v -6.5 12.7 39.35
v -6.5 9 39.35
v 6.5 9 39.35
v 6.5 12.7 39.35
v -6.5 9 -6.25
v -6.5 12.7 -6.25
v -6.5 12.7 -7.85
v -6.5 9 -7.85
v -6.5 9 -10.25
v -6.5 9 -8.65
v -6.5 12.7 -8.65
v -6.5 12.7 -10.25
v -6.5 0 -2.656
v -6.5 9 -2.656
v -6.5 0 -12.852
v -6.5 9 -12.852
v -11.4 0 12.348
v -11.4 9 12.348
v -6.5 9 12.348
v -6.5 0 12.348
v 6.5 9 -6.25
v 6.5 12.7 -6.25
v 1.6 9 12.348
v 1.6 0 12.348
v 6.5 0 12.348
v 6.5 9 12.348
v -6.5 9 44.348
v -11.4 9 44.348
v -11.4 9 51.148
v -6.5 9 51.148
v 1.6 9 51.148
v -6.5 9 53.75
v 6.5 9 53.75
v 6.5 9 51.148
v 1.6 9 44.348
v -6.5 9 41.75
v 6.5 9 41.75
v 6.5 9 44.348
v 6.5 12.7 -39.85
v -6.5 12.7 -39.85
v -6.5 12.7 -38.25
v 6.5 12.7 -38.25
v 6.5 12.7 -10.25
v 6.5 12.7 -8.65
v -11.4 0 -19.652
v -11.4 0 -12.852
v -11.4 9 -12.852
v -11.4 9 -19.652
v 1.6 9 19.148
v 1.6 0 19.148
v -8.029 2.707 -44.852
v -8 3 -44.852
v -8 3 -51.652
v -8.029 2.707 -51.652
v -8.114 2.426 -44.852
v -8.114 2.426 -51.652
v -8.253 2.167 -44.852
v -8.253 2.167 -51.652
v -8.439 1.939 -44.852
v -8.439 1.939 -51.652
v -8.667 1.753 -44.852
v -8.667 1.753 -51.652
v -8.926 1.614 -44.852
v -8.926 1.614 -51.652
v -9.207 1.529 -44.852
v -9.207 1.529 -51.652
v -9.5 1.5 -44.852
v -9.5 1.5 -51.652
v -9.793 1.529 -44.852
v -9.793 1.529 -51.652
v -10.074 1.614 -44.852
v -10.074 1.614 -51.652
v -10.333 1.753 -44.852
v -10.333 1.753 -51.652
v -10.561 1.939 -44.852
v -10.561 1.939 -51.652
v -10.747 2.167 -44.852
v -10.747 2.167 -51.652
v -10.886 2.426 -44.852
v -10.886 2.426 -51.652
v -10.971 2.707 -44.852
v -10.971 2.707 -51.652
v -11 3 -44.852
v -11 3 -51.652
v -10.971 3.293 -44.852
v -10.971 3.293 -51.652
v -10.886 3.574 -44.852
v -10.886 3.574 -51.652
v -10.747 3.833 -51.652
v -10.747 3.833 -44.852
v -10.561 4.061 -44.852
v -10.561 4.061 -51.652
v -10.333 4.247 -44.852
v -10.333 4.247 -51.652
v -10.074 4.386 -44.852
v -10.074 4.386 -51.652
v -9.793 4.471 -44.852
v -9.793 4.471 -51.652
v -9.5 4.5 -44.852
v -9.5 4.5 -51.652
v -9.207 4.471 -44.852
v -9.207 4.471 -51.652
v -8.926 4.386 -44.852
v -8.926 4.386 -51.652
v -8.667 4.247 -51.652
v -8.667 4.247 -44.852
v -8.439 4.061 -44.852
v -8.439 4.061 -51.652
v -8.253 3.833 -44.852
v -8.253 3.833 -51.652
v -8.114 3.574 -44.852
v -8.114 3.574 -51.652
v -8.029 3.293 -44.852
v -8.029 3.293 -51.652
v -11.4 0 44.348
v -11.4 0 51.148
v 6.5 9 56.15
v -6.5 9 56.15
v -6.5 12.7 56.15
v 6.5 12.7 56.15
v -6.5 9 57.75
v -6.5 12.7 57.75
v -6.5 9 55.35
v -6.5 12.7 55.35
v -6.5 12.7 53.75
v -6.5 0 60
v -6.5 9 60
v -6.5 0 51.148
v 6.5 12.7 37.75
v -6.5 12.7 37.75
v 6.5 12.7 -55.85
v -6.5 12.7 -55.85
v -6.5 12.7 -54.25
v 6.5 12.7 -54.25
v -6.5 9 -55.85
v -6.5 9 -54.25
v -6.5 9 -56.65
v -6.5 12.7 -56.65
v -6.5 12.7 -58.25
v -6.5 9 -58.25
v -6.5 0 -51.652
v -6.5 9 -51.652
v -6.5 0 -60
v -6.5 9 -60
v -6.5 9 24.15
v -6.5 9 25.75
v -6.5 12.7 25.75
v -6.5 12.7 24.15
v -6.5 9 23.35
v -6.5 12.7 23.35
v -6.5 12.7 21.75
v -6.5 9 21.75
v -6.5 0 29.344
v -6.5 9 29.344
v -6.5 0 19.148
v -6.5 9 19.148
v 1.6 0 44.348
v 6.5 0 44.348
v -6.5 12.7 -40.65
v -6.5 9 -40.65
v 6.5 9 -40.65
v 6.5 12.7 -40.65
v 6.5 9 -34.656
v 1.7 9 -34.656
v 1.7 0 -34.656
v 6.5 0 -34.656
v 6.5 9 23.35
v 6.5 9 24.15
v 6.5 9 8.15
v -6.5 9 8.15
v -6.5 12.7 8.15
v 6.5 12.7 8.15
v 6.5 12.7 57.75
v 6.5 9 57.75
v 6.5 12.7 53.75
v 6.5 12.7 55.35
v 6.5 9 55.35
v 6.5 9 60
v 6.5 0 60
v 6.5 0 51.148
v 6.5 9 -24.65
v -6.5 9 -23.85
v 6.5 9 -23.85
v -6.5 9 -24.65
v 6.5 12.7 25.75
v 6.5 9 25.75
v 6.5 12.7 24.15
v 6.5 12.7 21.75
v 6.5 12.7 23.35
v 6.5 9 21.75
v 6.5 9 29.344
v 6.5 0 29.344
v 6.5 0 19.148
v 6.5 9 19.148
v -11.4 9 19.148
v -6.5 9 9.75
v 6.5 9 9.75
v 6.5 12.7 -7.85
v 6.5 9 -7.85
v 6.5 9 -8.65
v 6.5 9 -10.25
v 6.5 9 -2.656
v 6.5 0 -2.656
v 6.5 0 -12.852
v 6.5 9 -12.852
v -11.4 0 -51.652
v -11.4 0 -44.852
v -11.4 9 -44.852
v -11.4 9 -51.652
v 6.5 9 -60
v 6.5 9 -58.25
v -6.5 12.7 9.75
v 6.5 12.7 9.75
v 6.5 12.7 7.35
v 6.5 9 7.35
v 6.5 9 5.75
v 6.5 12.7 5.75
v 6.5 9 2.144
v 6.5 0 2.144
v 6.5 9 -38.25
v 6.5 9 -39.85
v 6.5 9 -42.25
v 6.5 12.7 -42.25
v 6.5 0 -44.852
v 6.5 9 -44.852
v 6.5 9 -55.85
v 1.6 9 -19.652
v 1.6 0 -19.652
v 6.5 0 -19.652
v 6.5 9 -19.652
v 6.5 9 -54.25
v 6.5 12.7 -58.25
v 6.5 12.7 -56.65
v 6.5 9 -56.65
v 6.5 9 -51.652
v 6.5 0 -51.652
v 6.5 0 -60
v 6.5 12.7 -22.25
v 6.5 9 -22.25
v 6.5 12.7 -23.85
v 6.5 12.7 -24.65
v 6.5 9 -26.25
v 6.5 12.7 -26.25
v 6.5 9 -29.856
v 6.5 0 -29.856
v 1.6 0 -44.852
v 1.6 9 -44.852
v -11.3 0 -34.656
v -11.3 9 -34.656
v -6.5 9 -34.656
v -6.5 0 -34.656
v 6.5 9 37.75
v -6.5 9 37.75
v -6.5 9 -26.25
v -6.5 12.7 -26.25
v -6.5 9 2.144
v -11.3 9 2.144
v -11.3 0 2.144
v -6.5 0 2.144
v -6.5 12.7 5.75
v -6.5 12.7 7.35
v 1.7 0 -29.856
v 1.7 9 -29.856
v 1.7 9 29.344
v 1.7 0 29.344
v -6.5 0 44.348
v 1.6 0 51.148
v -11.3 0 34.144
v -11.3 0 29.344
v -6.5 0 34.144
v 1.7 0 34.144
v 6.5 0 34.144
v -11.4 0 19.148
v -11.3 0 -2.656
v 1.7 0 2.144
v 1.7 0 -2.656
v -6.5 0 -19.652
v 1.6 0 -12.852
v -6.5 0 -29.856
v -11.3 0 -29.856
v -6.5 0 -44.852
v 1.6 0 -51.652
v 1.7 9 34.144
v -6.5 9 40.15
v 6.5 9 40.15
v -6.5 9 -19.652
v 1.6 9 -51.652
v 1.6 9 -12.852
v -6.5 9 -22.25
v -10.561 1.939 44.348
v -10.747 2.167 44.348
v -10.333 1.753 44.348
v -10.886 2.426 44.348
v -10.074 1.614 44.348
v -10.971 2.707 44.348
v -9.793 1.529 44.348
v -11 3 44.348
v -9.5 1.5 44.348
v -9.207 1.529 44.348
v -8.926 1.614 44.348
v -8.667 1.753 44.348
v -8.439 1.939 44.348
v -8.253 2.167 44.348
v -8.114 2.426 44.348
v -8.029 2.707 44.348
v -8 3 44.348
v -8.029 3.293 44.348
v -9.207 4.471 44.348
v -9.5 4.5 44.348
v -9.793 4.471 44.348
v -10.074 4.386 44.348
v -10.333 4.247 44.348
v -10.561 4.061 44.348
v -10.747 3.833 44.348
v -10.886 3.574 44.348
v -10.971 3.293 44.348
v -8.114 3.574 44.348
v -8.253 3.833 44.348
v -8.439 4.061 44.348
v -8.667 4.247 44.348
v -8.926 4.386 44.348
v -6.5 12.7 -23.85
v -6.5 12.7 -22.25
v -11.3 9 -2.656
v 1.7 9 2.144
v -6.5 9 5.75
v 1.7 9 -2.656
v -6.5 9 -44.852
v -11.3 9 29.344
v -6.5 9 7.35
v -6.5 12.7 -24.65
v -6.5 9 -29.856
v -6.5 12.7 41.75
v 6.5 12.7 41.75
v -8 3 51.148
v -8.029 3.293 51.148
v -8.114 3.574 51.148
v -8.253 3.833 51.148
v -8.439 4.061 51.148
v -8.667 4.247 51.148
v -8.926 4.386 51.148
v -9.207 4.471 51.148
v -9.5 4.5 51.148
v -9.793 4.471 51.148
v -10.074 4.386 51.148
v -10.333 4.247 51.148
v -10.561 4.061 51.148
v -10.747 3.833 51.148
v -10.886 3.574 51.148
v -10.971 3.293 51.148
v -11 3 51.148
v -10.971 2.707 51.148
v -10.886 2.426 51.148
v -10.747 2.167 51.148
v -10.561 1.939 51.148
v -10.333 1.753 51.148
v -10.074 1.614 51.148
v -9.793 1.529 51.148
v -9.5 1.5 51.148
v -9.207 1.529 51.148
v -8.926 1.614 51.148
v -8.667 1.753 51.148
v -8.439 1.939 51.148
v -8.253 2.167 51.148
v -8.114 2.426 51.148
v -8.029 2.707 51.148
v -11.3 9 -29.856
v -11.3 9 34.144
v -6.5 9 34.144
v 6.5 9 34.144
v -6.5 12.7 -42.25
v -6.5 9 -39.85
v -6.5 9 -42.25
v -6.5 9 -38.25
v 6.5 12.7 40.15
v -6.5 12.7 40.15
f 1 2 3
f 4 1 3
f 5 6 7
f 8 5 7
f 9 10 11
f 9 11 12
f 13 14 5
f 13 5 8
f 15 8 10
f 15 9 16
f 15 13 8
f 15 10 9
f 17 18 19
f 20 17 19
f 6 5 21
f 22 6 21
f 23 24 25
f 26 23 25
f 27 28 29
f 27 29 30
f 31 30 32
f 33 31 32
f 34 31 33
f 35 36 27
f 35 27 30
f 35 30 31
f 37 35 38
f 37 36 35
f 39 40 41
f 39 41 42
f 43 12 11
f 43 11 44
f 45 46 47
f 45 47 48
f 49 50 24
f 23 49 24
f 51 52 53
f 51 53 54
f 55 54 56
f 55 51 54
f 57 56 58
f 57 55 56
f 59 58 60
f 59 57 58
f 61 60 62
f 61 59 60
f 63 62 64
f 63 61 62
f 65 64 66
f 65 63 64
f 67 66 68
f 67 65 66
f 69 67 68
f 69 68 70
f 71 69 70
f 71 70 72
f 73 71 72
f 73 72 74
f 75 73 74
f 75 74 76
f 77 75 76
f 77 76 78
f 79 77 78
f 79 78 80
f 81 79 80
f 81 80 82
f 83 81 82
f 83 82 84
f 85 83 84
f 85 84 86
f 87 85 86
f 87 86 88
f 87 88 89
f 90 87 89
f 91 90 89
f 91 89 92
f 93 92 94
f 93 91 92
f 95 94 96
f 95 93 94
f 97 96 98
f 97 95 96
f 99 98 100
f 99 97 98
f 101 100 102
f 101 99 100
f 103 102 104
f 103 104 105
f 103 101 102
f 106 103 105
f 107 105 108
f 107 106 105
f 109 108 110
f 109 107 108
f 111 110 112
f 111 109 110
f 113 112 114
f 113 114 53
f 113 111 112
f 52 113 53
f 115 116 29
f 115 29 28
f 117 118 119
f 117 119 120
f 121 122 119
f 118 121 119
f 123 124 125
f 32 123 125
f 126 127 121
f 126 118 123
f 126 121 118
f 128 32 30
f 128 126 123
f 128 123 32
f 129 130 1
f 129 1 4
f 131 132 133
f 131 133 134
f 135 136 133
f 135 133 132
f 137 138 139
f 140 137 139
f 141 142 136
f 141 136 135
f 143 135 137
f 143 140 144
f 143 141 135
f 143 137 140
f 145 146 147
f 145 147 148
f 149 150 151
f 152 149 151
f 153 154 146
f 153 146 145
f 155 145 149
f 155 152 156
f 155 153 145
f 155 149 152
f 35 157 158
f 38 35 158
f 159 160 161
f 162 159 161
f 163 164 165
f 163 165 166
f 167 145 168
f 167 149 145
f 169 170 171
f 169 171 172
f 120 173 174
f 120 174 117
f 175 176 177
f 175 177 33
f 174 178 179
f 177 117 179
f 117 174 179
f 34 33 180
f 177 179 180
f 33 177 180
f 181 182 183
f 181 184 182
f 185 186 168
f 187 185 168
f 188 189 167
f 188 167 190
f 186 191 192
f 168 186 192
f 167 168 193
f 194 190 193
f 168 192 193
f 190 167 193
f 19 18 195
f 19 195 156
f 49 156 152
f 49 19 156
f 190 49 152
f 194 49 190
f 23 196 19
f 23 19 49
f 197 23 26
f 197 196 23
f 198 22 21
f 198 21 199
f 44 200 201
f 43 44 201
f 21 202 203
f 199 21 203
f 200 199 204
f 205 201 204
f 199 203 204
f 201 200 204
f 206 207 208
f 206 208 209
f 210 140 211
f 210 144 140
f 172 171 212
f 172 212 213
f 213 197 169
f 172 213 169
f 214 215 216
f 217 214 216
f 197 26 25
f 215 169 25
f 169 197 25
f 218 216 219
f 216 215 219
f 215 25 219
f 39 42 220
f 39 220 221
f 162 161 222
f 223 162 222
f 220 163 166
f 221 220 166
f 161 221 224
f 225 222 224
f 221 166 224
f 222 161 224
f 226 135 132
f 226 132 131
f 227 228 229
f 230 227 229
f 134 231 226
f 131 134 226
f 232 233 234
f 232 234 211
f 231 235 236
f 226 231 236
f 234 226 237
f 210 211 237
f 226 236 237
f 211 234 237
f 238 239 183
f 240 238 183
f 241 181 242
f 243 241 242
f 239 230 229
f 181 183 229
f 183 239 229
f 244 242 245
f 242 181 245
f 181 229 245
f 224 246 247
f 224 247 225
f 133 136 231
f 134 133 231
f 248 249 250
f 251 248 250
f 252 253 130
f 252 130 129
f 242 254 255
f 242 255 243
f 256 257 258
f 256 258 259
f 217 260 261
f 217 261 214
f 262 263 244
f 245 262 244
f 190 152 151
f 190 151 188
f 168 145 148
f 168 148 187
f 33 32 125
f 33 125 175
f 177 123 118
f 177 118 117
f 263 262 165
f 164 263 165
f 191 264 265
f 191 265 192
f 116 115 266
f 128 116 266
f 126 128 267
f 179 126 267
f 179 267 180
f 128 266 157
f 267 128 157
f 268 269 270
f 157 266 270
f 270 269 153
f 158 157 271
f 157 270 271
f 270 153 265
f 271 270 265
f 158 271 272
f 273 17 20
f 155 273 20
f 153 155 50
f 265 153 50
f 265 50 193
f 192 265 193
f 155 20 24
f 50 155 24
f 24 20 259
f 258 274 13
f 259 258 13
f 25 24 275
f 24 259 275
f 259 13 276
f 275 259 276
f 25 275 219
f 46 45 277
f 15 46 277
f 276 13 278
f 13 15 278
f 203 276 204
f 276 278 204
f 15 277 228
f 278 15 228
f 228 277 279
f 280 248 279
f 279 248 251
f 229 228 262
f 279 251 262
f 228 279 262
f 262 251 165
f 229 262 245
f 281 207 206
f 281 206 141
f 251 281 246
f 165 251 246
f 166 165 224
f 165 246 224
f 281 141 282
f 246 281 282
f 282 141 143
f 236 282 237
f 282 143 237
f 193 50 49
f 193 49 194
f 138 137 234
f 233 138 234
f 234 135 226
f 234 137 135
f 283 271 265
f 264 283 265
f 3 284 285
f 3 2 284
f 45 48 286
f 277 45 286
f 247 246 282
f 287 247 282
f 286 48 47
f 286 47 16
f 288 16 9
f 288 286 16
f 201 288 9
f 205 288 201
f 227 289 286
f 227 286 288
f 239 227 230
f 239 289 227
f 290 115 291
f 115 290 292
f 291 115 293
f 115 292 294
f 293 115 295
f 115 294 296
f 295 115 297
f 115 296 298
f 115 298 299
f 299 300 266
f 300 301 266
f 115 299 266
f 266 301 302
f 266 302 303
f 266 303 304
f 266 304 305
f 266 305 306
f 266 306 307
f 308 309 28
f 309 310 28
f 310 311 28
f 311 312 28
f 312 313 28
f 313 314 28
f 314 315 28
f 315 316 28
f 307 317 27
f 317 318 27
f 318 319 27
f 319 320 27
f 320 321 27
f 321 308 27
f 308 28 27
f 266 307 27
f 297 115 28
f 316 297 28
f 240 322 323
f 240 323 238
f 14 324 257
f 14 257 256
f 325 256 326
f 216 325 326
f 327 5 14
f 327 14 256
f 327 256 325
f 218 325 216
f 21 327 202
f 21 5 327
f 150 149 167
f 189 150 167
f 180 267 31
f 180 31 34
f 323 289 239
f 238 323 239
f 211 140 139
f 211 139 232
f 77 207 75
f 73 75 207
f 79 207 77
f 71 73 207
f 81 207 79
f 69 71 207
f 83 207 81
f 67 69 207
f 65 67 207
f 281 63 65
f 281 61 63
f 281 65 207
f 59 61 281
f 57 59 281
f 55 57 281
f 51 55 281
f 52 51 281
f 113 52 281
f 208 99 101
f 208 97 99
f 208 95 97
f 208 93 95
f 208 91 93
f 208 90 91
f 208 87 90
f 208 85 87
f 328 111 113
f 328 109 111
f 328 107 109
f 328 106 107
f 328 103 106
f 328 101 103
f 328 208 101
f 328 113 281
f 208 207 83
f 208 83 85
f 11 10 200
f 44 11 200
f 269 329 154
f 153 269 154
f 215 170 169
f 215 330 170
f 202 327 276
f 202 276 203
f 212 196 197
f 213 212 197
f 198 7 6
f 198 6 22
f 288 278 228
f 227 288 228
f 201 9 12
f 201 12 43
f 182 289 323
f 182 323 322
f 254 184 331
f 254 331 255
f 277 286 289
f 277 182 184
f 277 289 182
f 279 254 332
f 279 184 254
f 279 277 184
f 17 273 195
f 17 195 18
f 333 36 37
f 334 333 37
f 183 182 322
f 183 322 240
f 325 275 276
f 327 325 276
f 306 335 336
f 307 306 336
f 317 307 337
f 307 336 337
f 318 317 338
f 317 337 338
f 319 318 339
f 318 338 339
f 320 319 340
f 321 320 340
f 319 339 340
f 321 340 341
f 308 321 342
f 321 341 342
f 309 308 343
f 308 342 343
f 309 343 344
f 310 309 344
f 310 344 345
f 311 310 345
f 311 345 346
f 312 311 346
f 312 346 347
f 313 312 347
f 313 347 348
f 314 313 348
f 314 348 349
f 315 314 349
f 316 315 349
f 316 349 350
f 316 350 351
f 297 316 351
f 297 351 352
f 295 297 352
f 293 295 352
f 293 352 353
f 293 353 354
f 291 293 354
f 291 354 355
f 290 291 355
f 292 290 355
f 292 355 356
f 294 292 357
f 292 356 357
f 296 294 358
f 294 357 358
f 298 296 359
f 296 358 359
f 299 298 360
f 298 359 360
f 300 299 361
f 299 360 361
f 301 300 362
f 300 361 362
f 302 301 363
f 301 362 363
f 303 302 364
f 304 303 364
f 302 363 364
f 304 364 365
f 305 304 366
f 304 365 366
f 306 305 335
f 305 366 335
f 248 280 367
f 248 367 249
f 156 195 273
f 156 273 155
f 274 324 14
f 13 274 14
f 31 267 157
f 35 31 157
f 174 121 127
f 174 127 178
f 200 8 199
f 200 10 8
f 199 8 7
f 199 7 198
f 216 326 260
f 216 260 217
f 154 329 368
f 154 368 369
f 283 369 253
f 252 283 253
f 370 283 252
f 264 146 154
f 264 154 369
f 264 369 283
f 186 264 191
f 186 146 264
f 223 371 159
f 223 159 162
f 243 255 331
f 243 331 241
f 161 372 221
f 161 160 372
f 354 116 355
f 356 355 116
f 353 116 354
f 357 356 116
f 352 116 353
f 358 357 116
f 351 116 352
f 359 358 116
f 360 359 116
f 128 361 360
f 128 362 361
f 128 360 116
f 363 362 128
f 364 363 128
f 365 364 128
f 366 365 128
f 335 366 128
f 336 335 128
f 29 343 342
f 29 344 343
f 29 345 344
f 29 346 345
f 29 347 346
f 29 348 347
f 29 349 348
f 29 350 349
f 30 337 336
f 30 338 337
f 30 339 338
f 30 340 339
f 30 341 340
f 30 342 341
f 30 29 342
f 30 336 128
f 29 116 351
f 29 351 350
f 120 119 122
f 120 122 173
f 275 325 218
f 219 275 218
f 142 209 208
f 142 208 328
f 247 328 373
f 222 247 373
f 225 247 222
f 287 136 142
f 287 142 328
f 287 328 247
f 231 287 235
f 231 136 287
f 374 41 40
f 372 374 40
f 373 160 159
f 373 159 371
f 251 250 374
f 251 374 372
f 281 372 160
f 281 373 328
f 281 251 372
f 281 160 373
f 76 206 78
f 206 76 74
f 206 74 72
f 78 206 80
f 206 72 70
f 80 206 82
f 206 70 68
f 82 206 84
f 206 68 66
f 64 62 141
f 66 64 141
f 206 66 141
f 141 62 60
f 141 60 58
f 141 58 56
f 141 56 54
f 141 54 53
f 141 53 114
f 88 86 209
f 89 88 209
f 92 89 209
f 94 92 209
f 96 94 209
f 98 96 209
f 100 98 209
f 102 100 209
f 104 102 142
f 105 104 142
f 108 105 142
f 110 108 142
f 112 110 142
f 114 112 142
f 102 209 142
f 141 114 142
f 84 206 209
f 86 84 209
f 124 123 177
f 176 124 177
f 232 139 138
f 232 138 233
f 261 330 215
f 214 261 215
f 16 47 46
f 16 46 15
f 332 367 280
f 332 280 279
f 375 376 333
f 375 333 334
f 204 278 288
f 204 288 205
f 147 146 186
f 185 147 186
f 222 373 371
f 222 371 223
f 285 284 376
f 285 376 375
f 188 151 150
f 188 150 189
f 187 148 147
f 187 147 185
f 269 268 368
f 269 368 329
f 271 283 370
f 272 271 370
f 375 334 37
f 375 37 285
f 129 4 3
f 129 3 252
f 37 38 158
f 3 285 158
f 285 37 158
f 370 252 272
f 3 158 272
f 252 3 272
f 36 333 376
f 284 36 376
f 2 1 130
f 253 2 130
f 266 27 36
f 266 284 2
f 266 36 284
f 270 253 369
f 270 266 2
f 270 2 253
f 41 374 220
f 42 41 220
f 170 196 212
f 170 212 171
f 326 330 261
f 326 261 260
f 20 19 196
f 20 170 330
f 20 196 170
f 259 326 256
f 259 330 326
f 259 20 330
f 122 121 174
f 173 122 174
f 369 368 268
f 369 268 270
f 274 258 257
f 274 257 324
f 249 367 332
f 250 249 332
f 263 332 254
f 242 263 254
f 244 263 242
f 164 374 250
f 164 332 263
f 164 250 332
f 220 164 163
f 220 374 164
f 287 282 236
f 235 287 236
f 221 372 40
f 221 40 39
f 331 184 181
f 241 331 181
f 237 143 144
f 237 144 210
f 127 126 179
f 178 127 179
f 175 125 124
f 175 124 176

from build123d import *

# Parameters (mm, degrees)
SKETCH1_W           = 13
SKETCH1_H           = 120
BOSS_EXTRUDE1_DEPTH = 9
SKETCH2_W           = 4.9
SKETCH2_H           = 6.8
BOSS_EXTRUDE2_DEPTH = 9
LPATTERN1_COUNT     = 4
LPATTERN1_PITCH     = 32
SKETCH3_W           = 4.8
SKETCH3_H           = 4.8
BOSS_EXTRUDE3_DEPTH = 9
LPATTERN2_COUNT     = 3
LPATTERN2_PITCH     = 32
SKETCH4_R           = 1.5
CUT_EXTRUDE1_DEPTH  = 9.6
CUT_EXTRUDE2_START  = -9.6
SKETCH5_R           = 1.5
CUT_EXTRUDE2_DEPTH  = 9.6
SKETCH6_W           = 13
SKETCH6_H           = 1.6
BOSS_EXTRUDE4_DEPTH = 3.7
LPATTERN3_COUNT     = 8
LPATTERN3_PITCH     = 16
SKETCH7_W           = 4.9
SKETCH7_H           = 6.8
CUT_EXTRUDE3_DEPTH  = 9
SKETCH8_W           = 4.8
SKETCH8_H           = 4.8
CUT_EXTRUDE4_DEPTH  = 9
LPATTERN4_COUNT     = 4
LPATTERN4_PITCH     = 32
LPATTERN5_COUNT     = 3
LPATTERN5_PITCH     = 32


with BuildPart() as part:
    # Sketch1 → Boss-Extrude1 (new body)
    with BuildSketch(Plane(origin=(0, 0, 0), x_dir=(1, 0, 0), z_dir=(0, 1, 0))):
        Rectangle(SKETCH1_W, SKETCH1_H)
    extrude(amount=BOSS_EXTRUDE1_DEPTH)

    # Sketch2 → Boss-Extrude2 (add)
    with BuildSketch(Plane(origin=(0, 9, 0), x_dir=(1, 0, 0), z_dir=(0, 1, 0))):
        with Locations((-8.95, 48.25183578)):
            Rectangle(SKETCH2_W, SKETCH2_H)
    boss_extrude2 = extrude(amount=-BOSS_EXTRUDE2_DEPTH)

    # LPattern1: Boss-Extrude2 ×4
    with Locations(*[(0, 0, i * LPATTERN1_PITCH) for i in range(1, LPATTERN1_COUNT)]):
        add(boss_extrude2)

    # Sketch3 → Boss-Extrude3 (add)
    with BuildSketch(Plane(origin=(0, 9, 0), x_dir=(1, 0, 0), z_dir=(0, 1, 0))):
        with Locations((-8.9, 32.256443)):
            Rectangle(SKETCH3_W, SKETCH3_H)
    boss_extrude3 = extrude(amount=-BOSS_EXTRUDE3_DEPTH)

    # LPattern2: Boss-Extrude3 ×3
    with Locations(*[(0, 0, i * LPATTERN2_PITCH) for i in range(1, LPATTERN2_COUNT)]):
        add(boss_extrude3)

    # Sketch4 → Cut-Extrude1 (cut)
    with BuildSketch(Plane.XY.offset(51.14816422)):
        with Locations((-9.5, 3)):
            Circle(SKETCH4_R)
    extrude(amount=-CUT_EXTRUDE1_DEPTH, mode=Mode.SUBTRACT)

    # Sketch5 → Cut-Extrude2 (cut)
    with BuildSketch(Plane(origin=(0, 0, -51.65183578), x_dir=(-1, 0, 0), z_dir=(0, 0, -1)).offset(CUT_EXTRUDE2_START)):
        with Locations(Location((9.5, 3, 0), (0, 0, 180))):
            Circle(SKETCH5_R)
    extrude(amount=CUT_EXTRUDE2_DEPTH, mode=Mode.SUBTRACT)

    # Sketch6 → Boss-Extrude4 (add)
    with BuildSketch(Plane(origin=(0, 9, 0), x_dir=(1, 0, 0), z_dir=(0, 1, 0))):
        with Locations((0, 57.45)):
            Rectangle(SKETCH6_W, SKETCH6_H)
        with Locations((0, 55.05)):
            Rectangle(SKETCH6_W, SKETCH6_H)
    boss_extrude4 = extrude(amount=BOSS_EXTRUDE4_DEPTH)

    # LPattern3: Boss-Extrude4 ×8
    with Locations(*[(0, 0, i * LPATTERN3_PITCH) for i in range(1, LPATTERN3_COUNT)]):
        add(boss_extrude4)

    # Sketch7 → Cut-Extrude3 (cut)
    with BuildSketch(Plane(origin=(0, 9, 0), x_dir=(1, 0, 0), z_dir=(0, 1, 0))):
        with Locations((4.05, 48.25183578)):
            Rectangle(SKETCH7_W, SKETCH7_H)
    cut_extrude3 = extrude(amount=-CUT_EXTRUDE3_DEPTH, mode=Mode.SUBTRACT)

    # Sketch8 → Cut-Extrude4 (cut)
    with BuildSketch(Plane(origin=(0, 9, 0), x_dir=(1, 0, 0), z_dir=(0, 1, 0))):
        with Locations((4.1, 32.256443)):
            Rectangle(SKETCH8_W, SKETCH8_H)
    cut_extrude4 = extrude(amount=-CUT_EXTRUDE4_DEPTH, mode=Mode.SUBTRACT)

    # LPattern4: Cut-Extrude3 ×4
    with Locations(*[(0, 0, i * LPATTERN4_PITCH) for i in range(1, LPATTERN4_COUNT)]):
        add(cut_extrude3, mode=Mode.SUBTRACT)

    # LPattern5: Cut-Extrude4 ×3
    with Locations(*[(0, 0, i * LPATTERN5_PITCH) for i in range(1, LPATTERN5_COUNT)]):
        add(cut_extrude4, mode=Mode.SUBTRACT)


solid = part.part
